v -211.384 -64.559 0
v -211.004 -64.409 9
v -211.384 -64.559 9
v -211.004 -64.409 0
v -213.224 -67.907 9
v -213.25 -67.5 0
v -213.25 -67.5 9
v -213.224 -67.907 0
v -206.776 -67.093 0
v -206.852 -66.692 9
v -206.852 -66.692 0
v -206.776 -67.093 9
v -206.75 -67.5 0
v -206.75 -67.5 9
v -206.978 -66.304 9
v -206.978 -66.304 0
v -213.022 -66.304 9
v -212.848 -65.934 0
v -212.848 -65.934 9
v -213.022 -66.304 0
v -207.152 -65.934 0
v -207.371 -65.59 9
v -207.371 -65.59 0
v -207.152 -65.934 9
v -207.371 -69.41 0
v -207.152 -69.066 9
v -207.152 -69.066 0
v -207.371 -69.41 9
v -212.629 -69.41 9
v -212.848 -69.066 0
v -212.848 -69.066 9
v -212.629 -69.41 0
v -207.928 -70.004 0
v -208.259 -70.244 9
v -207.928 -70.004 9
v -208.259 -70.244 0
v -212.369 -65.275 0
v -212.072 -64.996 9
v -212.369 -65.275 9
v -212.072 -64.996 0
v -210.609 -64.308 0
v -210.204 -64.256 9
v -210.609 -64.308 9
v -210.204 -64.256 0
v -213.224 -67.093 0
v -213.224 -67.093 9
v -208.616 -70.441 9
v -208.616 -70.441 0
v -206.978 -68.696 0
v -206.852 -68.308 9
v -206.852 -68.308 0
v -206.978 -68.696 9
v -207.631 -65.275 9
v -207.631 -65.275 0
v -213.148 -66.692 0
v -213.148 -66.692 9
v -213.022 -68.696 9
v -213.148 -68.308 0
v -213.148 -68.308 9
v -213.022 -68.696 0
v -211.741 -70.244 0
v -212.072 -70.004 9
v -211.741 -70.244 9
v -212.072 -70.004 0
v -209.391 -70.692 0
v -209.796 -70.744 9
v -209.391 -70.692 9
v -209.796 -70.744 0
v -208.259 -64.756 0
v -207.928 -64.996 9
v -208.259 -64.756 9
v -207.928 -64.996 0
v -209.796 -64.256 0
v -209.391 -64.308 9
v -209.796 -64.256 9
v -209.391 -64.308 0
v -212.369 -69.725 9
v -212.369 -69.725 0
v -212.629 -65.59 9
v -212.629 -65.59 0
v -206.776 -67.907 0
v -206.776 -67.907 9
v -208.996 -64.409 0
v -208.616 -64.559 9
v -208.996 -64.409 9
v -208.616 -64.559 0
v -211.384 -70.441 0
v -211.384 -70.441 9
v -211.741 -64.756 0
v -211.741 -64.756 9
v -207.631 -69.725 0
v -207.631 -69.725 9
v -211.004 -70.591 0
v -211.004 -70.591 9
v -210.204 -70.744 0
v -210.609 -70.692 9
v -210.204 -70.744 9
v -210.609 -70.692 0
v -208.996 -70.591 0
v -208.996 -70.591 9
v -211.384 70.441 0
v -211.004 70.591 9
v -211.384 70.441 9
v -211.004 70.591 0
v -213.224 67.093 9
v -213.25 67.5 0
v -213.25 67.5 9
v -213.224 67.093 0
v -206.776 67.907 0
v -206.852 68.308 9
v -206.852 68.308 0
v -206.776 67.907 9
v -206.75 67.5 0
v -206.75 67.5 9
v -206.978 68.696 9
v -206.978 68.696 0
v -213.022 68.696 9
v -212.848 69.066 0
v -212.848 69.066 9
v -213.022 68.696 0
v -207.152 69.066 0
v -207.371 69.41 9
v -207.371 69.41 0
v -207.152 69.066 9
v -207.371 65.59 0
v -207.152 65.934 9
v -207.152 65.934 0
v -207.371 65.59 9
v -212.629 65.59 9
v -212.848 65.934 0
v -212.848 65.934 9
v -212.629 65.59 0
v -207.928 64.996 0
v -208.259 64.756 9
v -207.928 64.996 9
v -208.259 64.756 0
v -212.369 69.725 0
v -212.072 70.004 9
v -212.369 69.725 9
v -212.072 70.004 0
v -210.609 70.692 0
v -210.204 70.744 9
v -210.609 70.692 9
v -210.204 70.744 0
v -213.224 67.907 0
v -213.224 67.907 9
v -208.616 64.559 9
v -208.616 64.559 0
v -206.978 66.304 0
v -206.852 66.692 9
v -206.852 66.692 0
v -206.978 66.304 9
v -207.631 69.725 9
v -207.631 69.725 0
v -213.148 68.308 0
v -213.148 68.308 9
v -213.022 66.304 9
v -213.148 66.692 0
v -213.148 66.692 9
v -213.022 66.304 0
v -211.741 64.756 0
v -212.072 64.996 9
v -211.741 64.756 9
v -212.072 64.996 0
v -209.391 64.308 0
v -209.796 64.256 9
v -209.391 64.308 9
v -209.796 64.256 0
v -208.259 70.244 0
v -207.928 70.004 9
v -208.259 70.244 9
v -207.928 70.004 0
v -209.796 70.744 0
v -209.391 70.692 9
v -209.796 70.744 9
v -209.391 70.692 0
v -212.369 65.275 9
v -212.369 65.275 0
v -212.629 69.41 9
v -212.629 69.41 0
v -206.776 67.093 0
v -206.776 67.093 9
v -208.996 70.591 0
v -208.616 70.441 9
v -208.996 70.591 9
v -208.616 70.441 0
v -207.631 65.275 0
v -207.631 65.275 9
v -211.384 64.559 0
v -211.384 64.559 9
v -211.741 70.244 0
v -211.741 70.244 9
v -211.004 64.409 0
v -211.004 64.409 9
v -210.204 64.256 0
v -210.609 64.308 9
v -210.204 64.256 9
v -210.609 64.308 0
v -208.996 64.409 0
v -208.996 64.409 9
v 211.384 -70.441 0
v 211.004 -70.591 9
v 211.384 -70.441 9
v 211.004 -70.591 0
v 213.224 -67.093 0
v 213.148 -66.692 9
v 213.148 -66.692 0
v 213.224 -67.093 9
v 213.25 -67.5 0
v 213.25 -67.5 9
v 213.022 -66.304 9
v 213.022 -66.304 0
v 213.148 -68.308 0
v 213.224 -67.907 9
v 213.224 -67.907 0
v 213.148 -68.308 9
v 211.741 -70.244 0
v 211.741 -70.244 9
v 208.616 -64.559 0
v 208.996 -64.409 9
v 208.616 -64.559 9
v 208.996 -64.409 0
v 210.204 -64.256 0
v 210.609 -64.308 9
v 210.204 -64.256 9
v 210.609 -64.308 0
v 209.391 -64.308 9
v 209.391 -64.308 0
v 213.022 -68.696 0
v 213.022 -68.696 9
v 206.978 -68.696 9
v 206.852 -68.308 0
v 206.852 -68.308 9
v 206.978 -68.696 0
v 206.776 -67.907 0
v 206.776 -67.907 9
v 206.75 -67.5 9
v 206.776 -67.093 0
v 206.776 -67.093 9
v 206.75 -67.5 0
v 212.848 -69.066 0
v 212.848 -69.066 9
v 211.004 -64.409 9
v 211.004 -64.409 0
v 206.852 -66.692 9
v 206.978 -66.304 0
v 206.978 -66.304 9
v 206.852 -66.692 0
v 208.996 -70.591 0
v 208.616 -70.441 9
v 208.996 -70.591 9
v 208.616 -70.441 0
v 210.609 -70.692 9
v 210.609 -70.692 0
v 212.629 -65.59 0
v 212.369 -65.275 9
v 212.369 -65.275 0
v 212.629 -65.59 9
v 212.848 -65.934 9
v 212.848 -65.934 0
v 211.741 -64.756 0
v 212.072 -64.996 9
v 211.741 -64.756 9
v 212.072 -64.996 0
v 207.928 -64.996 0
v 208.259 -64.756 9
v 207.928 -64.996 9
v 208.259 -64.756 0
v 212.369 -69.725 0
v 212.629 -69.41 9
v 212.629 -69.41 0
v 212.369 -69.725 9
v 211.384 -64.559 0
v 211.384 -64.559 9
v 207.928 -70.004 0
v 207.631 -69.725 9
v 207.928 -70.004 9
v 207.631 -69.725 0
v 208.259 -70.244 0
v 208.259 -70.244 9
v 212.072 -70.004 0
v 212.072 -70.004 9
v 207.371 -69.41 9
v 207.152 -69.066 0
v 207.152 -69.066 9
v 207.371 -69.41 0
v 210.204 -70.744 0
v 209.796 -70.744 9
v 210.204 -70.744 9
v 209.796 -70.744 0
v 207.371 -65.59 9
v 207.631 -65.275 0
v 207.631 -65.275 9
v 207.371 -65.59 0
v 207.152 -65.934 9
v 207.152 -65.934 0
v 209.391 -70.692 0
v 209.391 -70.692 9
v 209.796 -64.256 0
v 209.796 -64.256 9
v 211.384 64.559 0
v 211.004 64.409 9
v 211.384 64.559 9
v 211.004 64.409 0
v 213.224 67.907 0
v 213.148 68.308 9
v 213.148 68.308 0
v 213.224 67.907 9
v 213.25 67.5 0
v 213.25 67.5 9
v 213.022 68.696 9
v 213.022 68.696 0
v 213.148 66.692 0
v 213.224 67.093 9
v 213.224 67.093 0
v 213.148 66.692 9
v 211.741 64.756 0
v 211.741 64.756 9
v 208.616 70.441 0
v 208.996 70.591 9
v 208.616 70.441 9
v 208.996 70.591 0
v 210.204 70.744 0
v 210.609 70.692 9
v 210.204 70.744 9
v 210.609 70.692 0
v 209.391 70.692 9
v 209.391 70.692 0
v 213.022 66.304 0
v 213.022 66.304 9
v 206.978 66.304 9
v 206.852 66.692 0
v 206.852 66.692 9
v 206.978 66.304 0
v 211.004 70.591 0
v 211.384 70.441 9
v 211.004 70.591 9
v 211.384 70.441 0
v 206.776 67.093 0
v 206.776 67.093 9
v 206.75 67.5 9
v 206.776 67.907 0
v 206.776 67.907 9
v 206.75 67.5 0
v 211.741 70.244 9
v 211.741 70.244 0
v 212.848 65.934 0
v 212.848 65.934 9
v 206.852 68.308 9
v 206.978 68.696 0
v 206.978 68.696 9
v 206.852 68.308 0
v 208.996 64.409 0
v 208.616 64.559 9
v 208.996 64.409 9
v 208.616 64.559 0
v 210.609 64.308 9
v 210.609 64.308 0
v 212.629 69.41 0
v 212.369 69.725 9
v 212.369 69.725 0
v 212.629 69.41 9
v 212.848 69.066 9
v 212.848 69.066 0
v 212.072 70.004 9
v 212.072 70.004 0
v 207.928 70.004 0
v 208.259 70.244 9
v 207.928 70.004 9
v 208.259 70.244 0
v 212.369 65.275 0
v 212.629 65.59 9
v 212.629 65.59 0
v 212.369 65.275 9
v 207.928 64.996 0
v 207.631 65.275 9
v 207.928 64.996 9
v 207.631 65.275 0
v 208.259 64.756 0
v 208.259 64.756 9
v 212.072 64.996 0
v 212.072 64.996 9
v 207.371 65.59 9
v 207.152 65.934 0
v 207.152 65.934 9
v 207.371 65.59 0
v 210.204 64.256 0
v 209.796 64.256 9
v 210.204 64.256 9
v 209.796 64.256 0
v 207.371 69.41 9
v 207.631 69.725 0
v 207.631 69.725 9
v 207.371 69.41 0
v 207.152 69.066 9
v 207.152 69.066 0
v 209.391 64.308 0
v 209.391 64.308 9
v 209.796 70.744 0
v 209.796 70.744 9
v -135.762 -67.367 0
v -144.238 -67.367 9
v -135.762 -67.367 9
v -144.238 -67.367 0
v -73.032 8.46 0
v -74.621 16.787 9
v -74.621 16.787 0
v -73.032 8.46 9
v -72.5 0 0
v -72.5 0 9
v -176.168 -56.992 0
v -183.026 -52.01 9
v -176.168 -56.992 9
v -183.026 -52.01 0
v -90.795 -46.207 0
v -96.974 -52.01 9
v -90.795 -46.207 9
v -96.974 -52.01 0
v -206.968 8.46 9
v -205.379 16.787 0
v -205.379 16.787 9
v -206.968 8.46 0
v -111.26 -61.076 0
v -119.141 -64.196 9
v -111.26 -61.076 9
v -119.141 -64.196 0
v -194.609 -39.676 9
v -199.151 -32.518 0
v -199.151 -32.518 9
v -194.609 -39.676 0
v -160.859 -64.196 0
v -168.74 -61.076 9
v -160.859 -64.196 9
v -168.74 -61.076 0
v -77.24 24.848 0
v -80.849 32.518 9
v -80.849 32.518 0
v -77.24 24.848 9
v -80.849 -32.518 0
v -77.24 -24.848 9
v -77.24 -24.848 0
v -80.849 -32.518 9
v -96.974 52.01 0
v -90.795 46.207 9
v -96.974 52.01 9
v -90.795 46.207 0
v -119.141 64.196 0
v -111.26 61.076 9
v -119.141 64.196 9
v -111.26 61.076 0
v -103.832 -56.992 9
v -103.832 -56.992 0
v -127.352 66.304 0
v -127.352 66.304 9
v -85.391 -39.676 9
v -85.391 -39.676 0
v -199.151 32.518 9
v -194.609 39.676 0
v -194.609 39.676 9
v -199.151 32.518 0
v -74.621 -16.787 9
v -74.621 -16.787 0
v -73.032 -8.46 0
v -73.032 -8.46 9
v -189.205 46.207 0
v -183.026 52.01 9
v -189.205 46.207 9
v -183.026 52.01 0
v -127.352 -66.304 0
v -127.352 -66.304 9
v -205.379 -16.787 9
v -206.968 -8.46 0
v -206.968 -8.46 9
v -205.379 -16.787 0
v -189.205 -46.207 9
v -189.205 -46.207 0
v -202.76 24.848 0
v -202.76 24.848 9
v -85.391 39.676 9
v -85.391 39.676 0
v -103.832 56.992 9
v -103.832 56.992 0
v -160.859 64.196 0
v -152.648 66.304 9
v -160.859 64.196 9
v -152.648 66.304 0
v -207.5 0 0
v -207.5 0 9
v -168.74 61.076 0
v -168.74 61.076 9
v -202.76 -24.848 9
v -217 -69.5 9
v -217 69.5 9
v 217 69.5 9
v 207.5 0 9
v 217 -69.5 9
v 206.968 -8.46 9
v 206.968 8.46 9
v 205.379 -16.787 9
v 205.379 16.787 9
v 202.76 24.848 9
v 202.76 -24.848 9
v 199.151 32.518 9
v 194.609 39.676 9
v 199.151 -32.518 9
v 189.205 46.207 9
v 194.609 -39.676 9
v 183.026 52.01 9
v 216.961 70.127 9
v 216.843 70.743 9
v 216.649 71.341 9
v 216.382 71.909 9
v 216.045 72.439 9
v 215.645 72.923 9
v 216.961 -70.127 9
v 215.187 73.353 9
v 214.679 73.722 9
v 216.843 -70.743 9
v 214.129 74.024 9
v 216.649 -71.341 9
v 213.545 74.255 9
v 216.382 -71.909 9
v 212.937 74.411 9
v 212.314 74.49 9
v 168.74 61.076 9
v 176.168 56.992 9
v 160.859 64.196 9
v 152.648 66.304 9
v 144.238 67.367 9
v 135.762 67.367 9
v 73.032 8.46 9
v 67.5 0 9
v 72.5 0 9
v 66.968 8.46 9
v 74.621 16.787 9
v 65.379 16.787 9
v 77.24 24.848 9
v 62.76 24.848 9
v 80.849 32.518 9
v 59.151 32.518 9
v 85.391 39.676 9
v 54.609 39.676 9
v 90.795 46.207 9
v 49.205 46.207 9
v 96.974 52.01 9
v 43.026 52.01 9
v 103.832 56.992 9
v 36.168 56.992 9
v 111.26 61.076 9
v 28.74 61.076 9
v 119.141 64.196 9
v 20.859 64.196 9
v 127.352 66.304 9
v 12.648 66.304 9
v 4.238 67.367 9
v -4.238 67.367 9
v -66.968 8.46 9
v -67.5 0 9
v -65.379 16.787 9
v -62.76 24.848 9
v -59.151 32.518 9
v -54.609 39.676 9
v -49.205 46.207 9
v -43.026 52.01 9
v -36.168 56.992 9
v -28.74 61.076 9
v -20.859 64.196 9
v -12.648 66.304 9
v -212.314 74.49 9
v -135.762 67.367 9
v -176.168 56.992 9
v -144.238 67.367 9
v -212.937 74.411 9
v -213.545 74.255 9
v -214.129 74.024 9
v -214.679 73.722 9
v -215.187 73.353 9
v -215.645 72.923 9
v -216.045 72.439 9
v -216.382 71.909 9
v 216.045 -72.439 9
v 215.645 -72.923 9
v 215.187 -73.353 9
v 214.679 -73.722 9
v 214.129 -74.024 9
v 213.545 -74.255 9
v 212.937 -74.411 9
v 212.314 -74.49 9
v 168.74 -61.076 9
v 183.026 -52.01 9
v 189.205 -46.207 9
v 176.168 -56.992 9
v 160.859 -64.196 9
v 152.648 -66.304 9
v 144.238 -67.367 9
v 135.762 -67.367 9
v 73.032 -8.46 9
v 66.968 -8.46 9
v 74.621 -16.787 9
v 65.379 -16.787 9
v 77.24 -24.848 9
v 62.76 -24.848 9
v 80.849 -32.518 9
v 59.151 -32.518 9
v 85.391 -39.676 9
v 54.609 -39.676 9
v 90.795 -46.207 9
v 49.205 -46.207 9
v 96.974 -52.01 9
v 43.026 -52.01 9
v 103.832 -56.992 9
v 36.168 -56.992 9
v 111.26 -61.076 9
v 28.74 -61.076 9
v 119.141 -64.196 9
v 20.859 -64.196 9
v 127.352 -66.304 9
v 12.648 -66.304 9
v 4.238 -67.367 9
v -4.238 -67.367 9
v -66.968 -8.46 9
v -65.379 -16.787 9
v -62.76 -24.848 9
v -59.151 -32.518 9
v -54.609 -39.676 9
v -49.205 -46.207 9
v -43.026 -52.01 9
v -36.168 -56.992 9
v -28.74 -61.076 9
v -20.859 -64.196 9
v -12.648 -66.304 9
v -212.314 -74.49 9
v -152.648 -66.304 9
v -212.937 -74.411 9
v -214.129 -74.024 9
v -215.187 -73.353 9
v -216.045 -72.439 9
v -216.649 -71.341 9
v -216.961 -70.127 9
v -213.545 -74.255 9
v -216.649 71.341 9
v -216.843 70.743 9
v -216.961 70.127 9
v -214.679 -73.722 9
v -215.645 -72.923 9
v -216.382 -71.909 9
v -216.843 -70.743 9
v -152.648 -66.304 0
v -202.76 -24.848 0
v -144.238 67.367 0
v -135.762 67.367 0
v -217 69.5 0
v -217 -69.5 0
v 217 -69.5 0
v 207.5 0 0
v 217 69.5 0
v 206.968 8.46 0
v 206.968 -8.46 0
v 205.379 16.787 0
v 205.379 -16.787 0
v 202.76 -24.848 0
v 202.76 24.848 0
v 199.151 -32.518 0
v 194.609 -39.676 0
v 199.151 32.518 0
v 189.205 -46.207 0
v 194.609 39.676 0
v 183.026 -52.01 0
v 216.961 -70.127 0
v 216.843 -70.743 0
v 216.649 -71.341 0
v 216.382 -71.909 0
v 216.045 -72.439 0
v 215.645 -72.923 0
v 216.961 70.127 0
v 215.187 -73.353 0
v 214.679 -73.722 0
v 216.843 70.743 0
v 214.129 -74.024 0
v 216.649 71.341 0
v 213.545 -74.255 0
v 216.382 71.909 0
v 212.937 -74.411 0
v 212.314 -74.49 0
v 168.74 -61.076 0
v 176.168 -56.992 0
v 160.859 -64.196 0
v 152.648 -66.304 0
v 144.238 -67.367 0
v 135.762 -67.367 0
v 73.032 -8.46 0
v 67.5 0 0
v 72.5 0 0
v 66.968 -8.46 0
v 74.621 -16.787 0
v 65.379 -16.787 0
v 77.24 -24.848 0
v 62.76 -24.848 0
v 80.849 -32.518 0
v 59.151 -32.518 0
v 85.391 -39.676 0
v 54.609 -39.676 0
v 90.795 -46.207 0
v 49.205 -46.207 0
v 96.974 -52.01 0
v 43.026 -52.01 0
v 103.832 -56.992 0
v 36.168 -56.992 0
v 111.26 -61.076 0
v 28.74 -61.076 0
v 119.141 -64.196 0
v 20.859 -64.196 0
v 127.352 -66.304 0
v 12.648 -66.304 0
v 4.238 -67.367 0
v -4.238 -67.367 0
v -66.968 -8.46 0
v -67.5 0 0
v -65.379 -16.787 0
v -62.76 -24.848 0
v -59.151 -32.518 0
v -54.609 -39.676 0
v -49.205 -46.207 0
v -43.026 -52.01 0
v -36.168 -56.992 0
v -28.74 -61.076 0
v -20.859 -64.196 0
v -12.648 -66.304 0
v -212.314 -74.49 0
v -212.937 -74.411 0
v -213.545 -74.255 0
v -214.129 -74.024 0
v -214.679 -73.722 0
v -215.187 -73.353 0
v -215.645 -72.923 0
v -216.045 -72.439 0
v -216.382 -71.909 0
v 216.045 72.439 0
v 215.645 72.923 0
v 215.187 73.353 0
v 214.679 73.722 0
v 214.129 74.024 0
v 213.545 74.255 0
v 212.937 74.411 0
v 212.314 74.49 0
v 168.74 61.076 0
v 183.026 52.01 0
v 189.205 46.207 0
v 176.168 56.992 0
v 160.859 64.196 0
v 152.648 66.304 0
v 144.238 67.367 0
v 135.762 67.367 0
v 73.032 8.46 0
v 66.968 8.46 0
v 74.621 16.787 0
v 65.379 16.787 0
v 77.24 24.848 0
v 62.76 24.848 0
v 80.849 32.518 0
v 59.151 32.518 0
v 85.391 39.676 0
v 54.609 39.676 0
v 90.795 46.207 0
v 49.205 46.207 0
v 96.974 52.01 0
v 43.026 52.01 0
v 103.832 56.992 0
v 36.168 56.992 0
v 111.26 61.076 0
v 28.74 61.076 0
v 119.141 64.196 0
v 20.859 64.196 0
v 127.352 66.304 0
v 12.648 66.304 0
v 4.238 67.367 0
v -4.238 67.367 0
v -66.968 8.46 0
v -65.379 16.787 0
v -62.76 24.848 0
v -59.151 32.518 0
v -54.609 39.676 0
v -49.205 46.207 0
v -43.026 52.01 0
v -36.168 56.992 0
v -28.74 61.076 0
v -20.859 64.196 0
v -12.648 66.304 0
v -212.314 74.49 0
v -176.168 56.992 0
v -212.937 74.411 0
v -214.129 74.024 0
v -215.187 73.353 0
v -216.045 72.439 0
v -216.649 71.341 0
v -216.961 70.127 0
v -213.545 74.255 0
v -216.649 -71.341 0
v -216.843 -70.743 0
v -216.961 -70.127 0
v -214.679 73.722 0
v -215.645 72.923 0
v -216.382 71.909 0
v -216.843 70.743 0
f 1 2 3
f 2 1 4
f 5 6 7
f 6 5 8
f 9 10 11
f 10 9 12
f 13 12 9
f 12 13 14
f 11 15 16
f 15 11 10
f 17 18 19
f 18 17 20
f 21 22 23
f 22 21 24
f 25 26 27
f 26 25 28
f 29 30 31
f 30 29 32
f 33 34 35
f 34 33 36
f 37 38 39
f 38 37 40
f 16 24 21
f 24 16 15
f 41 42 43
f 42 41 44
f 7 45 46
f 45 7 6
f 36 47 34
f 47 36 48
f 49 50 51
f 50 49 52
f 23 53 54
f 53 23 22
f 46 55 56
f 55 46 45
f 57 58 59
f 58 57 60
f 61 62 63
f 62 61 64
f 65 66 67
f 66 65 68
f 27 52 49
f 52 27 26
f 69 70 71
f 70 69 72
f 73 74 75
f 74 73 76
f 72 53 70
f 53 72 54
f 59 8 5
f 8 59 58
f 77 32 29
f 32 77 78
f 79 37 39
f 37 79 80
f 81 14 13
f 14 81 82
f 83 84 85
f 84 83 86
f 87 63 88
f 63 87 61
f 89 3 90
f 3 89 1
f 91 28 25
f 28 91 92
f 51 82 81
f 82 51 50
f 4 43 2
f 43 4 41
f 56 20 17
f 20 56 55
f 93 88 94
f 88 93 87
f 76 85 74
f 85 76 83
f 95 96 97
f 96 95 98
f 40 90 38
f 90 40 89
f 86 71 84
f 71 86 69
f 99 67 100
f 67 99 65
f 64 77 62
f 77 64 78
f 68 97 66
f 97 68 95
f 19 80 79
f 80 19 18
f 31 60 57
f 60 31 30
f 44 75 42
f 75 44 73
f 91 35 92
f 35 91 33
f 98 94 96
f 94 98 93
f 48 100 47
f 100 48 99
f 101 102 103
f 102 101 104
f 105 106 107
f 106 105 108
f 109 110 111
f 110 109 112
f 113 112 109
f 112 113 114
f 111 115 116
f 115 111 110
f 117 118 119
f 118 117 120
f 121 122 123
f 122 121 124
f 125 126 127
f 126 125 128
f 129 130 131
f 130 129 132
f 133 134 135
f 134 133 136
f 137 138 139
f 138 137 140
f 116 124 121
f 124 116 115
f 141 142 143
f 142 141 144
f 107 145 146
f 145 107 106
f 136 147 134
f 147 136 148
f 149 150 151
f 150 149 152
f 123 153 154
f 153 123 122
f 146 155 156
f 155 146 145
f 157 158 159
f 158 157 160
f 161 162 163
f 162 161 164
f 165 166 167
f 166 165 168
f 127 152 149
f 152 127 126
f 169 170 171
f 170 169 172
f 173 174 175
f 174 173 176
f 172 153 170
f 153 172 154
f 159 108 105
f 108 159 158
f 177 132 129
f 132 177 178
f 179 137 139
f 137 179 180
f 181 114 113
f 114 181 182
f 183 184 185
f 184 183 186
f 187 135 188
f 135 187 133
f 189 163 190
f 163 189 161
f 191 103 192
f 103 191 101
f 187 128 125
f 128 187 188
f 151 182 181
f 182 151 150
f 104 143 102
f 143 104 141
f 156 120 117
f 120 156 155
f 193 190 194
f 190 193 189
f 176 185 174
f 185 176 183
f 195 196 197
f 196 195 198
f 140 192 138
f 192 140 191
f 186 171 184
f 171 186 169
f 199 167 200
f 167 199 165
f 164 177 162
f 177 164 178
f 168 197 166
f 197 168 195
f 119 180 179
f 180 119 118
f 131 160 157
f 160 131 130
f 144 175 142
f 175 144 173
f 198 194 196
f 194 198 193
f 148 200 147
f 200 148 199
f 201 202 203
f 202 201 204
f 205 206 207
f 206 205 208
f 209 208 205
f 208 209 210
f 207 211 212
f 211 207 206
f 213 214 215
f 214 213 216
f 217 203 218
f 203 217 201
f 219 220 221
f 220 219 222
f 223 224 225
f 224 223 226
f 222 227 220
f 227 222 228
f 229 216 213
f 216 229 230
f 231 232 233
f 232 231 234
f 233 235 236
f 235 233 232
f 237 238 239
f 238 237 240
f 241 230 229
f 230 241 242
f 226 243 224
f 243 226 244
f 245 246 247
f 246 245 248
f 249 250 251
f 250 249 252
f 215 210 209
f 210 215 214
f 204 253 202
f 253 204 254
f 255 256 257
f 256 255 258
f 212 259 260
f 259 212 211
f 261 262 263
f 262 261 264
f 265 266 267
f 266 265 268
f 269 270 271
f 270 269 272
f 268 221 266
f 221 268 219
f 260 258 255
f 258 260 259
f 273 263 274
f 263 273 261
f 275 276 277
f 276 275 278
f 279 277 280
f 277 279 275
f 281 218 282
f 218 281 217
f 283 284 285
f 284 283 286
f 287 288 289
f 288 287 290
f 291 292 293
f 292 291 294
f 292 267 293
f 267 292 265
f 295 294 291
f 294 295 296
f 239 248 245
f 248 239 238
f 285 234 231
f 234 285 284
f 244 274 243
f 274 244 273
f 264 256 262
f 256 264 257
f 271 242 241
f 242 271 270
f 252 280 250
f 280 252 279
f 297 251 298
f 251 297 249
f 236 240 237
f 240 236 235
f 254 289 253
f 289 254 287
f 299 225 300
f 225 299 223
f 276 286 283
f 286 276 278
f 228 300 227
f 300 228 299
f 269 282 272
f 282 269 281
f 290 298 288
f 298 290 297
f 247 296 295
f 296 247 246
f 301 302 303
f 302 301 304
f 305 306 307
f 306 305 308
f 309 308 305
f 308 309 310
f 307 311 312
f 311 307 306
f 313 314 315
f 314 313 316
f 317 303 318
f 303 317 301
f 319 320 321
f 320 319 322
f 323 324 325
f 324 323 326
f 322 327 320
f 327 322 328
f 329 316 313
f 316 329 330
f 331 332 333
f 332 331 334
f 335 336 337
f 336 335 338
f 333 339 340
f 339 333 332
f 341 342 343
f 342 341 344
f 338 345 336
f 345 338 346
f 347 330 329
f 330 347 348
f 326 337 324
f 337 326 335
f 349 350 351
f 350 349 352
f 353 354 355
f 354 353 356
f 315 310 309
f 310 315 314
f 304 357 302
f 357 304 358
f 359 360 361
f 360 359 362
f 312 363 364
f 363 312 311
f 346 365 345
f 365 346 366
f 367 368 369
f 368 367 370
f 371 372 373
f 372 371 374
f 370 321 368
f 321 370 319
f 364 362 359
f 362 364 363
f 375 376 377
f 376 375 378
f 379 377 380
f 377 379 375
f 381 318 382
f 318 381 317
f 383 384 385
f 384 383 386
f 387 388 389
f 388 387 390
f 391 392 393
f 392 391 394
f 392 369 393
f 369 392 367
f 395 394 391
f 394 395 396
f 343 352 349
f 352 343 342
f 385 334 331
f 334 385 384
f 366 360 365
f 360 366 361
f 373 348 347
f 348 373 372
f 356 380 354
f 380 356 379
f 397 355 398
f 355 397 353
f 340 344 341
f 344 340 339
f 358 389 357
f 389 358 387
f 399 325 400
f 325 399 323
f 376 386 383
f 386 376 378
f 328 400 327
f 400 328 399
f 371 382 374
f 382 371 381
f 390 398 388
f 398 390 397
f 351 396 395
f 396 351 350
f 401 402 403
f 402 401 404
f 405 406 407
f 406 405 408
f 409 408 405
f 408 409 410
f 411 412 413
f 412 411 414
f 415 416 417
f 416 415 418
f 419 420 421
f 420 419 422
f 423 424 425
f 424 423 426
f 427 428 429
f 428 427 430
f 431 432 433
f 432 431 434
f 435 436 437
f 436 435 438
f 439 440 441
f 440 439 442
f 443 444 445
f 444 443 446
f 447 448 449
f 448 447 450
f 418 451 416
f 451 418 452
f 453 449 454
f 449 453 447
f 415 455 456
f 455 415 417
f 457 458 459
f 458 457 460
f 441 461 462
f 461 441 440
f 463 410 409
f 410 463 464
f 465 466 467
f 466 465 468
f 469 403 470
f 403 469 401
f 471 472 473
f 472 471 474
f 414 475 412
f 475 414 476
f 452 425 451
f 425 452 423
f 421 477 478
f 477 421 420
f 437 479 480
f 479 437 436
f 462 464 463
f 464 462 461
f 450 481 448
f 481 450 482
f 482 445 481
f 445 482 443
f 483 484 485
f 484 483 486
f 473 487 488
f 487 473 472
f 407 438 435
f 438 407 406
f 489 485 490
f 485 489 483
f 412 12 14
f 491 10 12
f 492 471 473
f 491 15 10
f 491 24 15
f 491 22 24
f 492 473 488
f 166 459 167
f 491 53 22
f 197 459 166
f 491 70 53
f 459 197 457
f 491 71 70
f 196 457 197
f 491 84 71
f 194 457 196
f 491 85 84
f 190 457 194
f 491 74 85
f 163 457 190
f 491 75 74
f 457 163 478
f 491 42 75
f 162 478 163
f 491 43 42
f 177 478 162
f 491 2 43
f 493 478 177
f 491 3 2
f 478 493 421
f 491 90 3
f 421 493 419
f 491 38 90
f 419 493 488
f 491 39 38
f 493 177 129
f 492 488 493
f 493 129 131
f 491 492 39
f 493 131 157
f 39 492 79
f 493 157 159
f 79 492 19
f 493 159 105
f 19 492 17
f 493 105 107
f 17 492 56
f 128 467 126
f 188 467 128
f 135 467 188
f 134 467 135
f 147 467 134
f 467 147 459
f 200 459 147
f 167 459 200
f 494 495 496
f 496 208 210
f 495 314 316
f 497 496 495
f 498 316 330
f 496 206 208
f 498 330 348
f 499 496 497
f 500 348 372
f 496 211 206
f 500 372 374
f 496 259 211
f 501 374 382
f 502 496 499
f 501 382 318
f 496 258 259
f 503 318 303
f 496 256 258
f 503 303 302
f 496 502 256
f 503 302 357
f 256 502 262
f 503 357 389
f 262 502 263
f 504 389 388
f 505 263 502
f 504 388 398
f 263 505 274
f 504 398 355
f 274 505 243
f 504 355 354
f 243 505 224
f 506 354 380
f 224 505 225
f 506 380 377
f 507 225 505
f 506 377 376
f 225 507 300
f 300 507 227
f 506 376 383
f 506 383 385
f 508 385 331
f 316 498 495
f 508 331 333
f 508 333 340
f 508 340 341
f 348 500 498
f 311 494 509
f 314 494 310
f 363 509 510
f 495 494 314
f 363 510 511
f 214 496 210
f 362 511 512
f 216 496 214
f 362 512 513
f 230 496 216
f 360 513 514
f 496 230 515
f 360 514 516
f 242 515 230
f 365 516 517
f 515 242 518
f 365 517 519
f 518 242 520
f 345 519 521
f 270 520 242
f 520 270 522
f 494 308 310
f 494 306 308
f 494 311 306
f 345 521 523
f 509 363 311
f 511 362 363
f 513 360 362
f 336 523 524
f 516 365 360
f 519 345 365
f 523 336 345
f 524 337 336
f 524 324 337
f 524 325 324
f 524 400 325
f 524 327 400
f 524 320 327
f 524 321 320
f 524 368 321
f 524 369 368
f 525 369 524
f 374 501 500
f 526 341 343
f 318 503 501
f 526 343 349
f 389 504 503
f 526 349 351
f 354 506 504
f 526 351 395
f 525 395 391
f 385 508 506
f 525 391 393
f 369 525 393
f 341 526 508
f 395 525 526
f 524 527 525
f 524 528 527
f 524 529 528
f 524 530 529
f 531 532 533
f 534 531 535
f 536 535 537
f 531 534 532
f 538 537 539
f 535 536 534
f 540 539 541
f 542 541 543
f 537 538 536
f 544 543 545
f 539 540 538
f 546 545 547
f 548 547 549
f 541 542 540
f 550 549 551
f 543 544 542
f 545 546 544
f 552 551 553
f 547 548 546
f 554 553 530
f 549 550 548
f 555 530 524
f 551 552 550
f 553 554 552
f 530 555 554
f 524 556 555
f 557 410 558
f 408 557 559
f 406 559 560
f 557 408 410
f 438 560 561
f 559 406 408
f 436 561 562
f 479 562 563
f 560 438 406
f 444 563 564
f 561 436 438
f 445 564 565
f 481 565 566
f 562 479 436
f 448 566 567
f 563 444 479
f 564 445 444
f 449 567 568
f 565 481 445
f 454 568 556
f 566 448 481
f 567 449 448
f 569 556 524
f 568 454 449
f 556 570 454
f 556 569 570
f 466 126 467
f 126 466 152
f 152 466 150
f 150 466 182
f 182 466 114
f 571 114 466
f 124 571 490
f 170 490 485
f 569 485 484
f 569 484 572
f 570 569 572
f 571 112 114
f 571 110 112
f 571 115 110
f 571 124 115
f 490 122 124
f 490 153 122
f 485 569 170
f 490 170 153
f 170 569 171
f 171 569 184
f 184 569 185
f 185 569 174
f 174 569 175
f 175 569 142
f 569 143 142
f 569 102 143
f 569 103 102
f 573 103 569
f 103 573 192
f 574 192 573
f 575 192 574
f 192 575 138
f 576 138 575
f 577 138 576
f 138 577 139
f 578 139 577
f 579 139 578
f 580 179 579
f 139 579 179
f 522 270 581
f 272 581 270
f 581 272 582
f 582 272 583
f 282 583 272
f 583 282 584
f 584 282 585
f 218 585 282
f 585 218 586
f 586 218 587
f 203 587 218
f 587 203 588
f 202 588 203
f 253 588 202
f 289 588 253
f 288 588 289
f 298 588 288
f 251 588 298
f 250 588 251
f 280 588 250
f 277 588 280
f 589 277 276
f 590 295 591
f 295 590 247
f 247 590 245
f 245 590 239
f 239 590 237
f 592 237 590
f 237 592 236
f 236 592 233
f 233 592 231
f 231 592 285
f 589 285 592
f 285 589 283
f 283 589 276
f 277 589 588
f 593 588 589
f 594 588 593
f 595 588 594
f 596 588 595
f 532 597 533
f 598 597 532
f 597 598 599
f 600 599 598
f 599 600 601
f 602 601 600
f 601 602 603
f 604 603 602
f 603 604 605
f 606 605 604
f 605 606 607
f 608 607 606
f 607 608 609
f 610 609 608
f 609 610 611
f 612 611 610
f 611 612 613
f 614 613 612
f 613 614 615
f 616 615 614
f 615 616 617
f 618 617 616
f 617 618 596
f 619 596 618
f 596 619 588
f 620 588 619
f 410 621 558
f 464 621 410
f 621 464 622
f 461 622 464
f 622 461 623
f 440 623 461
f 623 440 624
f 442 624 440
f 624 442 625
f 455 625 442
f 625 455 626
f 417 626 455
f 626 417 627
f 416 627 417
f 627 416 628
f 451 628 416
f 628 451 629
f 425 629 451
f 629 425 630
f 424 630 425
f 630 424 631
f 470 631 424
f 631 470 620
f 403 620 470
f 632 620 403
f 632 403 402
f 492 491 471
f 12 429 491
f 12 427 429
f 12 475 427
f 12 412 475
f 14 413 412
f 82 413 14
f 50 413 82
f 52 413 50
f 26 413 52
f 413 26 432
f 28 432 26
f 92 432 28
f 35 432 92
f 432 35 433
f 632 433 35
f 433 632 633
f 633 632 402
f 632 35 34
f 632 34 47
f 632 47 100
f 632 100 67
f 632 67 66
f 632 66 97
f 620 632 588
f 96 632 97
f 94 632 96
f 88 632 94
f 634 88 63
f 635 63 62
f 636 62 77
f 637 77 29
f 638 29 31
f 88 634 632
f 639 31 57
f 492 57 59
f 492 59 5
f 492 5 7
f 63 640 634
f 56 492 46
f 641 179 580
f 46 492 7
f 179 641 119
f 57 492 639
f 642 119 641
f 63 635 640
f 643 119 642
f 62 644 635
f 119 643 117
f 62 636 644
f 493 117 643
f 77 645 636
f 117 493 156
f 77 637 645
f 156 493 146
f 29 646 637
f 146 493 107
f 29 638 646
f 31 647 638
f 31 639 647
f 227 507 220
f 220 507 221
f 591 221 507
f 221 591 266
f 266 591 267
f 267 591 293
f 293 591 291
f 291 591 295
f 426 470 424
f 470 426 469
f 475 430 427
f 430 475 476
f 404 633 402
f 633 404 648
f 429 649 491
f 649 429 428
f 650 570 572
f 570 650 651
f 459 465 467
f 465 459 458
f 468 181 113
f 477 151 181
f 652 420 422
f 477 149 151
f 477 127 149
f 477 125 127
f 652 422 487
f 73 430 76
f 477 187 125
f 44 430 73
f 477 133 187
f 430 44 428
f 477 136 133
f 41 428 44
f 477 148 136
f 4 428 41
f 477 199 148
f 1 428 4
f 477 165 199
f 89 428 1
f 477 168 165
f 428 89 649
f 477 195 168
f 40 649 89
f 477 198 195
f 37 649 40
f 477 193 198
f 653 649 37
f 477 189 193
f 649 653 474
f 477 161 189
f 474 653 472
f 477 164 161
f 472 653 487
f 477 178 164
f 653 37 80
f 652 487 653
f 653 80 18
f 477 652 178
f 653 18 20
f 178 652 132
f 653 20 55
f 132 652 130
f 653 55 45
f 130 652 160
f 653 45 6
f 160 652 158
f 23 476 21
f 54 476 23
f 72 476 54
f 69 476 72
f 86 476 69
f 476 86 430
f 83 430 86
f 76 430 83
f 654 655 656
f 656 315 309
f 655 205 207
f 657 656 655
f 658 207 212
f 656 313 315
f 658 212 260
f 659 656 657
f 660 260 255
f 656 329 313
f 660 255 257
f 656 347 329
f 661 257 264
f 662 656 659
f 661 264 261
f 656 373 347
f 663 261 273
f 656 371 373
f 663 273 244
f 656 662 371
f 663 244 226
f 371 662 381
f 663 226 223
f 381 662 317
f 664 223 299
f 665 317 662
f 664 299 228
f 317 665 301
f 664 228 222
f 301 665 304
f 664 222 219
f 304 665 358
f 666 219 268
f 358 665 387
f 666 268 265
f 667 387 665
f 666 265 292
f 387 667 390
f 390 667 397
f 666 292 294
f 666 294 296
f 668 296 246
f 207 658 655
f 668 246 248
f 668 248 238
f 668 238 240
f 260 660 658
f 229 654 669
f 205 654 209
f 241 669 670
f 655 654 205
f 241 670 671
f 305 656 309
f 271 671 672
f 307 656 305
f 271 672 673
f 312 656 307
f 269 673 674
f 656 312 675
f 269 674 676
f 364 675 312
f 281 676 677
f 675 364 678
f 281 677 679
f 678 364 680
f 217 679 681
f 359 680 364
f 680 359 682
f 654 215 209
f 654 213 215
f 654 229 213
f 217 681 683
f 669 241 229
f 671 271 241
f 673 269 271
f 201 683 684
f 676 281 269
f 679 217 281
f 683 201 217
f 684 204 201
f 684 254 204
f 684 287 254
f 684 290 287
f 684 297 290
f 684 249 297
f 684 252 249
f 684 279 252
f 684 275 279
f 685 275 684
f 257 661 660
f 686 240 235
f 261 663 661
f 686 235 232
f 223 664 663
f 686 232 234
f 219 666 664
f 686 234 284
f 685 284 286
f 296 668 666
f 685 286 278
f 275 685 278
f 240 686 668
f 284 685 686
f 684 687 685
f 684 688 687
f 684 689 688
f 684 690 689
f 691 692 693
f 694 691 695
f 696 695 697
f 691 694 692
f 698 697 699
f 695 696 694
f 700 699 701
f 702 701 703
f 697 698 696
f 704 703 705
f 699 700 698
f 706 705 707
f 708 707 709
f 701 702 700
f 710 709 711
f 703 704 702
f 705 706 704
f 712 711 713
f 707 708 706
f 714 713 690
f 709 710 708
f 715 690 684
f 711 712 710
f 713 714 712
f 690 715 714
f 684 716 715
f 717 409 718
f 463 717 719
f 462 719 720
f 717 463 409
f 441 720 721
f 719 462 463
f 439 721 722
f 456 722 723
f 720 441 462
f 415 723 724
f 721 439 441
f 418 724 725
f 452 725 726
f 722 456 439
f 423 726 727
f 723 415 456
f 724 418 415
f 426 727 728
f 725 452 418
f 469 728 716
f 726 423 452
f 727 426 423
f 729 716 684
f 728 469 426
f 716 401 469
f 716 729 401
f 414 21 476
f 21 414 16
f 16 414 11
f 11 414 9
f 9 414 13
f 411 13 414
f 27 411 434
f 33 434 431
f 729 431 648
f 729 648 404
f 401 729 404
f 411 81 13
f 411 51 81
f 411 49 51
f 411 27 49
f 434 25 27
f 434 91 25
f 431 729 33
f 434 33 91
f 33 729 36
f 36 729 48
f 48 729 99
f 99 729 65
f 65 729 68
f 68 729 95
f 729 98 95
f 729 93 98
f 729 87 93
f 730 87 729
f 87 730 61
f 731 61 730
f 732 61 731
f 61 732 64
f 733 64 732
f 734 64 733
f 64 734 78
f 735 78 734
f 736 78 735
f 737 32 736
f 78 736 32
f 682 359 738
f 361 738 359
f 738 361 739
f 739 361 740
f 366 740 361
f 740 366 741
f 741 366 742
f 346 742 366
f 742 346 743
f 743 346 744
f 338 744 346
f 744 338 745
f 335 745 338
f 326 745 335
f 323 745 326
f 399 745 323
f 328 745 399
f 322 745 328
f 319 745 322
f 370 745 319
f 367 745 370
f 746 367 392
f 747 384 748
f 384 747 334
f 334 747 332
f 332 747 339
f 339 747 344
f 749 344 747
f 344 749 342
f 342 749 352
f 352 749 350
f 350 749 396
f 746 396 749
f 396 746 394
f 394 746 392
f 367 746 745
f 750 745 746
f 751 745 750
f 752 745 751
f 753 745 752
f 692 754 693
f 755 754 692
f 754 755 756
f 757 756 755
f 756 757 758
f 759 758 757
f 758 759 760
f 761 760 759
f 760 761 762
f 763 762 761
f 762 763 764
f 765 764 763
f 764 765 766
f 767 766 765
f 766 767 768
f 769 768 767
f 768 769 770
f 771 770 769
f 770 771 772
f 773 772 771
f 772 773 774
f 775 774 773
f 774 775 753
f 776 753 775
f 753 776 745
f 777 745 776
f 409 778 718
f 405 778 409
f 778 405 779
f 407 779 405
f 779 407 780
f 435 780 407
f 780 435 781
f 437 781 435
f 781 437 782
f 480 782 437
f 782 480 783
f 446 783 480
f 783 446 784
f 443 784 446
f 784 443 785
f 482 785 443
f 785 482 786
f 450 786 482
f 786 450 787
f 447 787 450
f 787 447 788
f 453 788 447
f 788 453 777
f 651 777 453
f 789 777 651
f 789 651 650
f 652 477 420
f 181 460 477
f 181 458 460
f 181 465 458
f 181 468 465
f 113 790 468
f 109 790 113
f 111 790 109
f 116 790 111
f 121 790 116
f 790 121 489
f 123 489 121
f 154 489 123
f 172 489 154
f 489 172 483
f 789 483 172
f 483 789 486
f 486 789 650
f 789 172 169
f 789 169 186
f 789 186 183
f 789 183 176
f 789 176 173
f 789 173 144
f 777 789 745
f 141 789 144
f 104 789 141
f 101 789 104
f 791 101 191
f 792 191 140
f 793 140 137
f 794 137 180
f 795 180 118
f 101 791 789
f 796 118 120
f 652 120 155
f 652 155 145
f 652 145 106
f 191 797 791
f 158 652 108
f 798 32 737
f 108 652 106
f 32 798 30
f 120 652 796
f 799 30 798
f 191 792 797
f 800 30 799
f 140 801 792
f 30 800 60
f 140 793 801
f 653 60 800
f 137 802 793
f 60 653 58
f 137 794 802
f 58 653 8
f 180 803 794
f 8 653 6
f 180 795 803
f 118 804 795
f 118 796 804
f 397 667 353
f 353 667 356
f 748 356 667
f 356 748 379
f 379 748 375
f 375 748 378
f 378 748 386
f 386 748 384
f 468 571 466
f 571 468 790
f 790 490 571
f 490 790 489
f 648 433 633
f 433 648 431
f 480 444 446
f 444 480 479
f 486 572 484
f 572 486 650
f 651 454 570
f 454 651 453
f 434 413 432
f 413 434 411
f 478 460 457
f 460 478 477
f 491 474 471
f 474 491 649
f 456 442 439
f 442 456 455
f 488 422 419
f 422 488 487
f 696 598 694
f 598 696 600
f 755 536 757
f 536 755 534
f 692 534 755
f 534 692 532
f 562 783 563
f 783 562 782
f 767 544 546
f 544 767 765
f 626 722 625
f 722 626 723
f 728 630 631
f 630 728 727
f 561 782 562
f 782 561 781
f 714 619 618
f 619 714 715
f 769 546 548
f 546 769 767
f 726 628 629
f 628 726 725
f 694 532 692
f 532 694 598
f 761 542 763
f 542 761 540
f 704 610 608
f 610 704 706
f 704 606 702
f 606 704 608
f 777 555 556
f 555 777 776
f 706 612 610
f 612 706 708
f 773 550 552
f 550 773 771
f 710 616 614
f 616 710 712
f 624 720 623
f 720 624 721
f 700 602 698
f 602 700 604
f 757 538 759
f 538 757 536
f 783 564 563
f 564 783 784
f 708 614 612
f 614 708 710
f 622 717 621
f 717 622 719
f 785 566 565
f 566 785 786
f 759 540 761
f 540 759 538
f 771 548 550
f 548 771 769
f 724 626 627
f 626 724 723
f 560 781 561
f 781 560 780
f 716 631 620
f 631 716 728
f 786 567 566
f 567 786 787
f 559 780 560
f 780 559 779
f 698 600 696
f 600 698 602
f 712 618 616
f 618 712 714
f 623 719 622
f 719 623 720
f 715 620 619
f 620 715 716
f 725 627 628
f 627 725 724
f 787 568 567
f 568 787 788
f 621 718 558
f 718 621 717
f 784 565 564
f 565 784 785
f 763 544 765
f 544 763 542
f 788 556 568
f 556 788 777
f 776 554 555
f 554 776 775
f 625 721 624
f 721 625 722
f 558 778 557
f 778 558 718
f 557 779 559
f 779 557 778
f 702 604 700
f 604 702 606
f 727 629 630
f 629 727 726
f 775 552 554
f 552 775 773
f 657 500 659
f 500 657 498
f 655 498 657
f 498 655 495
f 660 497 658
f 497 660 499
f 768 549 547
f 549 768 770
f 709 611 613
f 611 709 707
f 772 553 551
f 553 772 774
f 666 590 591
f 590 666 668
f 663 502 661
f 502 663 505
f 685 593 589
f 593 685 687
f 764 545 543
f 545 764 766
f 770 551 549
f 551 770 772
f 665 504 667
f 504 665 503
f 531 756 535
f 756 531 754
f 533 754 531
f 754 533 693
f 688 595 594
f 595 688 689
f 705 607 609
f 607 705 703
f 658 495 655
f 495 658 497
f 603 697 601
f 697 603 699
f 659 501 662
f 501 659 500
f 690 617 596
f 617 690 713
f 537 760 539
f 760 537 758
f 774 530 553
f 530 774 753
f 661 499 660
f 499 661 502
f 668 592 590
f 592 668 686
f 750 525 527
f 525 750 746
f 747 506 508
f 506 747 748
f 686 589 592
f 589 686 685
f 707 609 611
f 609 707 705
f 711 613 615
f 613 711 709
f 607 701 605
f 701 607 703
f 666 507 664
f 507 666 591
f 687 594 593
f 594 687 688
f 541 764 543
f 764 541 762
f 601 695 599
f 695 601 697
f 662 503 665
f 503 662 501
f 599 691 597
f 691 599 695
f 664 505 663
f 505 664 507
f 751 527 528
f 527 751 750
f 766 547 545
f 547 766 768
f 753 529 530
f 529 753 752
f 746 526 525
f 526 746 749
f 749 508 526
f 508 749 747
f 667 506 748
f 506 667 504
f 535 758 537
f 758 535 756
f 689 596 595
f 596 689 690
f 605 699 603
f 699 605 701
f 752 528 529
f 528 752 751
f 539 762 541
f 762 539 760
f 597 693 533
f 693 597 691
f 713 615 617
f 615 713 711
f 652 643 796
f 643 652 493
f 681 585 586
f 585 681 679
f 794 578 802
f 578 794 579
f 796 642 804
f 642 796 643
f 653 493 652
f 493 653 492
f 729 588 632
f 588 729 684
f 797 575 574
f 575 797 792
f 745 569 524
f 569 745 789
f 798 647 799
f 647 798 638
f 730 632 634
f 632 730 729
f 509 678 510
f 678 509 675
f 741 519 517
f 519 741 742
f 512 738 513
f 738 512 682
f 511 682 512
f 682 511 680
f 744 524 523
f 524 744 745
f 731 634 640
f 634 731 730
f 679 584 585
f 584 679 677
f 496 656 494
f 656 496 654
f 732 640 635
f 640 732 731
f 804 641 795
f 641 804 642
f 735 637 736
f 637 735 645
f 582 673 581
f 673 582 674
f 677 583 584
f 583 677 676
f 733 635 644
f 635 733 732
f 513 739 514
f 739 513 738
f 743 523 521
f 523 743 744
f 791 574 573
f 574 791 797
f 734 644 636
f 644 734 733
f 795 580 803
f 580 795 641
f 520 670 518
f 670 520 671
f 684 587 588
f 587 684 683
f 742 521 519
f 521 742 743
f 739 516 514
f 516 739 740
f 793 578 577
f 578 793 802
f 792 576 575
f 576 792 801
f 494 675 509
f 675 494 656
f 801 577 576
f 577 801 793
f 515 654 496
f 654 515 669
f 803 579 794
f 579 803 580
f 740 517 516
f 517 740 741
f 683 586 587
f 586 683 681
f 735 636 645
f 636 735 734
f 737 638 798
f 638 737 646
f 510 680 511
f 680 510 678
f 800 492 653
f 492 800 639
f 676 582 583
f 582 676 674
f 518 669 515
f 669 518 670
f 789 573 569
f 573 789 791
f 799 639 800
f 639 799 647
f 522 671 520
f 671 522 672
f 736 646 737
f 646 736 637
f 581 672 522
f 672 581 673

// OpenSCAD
$fn = 50;


difference() {
	union() {
		hull() {
			translate(v = [-212.0000000000, 69.5000000000, 0]) {
				cylinder(h = 9, r = 5);
			}
			translate(v = [212.0000000000, 69.5000000000, 0]) {
				cylinder(h = 9, r = 5);
			}
			translate(v = [-212.0000000000, -69.5000000000, 0]) {
				cylinder(h = 9, r = 5);
			}
			translate(v = [212.0000000000, -69.5000000000, 0]) {
				cylinder(h = 9, r = 5);
			}
		}
	}
	union() {
		#translate(v = [-210.0000000000, -67.5000000000, -100.0000000000]) {
			cylinder(h = 200, r = 3.2500000000);
		}
		#translate(v = [-210.0000000000, 67.5000000000, -100.0000000000]) {
			cylinder(h = 200, r = 3.2500000000);
		}
		#translate(v = [210.0000000000, -67.5000000000, -100.0000000000]) {
			cylinder(h = 200, r = 3.2500000000);
		}
		#translate(v = [210.0000000000, 67.5000000000, -100.0000000000]) {
			cylinder(h = 200, r = 3.2500000000);
		}
		#translate(v = [-140.0000000000, 0, 0]) {
			cylinder(h = 9, r = 67.5000000000);
		}
		#cylinder(h = 9, r = 67.5000000000);
		#translate(v = [140.0000000000, 0, 0]) {
			cylinder(h = 9, r = 67.5000000000);
		}
	}
}
